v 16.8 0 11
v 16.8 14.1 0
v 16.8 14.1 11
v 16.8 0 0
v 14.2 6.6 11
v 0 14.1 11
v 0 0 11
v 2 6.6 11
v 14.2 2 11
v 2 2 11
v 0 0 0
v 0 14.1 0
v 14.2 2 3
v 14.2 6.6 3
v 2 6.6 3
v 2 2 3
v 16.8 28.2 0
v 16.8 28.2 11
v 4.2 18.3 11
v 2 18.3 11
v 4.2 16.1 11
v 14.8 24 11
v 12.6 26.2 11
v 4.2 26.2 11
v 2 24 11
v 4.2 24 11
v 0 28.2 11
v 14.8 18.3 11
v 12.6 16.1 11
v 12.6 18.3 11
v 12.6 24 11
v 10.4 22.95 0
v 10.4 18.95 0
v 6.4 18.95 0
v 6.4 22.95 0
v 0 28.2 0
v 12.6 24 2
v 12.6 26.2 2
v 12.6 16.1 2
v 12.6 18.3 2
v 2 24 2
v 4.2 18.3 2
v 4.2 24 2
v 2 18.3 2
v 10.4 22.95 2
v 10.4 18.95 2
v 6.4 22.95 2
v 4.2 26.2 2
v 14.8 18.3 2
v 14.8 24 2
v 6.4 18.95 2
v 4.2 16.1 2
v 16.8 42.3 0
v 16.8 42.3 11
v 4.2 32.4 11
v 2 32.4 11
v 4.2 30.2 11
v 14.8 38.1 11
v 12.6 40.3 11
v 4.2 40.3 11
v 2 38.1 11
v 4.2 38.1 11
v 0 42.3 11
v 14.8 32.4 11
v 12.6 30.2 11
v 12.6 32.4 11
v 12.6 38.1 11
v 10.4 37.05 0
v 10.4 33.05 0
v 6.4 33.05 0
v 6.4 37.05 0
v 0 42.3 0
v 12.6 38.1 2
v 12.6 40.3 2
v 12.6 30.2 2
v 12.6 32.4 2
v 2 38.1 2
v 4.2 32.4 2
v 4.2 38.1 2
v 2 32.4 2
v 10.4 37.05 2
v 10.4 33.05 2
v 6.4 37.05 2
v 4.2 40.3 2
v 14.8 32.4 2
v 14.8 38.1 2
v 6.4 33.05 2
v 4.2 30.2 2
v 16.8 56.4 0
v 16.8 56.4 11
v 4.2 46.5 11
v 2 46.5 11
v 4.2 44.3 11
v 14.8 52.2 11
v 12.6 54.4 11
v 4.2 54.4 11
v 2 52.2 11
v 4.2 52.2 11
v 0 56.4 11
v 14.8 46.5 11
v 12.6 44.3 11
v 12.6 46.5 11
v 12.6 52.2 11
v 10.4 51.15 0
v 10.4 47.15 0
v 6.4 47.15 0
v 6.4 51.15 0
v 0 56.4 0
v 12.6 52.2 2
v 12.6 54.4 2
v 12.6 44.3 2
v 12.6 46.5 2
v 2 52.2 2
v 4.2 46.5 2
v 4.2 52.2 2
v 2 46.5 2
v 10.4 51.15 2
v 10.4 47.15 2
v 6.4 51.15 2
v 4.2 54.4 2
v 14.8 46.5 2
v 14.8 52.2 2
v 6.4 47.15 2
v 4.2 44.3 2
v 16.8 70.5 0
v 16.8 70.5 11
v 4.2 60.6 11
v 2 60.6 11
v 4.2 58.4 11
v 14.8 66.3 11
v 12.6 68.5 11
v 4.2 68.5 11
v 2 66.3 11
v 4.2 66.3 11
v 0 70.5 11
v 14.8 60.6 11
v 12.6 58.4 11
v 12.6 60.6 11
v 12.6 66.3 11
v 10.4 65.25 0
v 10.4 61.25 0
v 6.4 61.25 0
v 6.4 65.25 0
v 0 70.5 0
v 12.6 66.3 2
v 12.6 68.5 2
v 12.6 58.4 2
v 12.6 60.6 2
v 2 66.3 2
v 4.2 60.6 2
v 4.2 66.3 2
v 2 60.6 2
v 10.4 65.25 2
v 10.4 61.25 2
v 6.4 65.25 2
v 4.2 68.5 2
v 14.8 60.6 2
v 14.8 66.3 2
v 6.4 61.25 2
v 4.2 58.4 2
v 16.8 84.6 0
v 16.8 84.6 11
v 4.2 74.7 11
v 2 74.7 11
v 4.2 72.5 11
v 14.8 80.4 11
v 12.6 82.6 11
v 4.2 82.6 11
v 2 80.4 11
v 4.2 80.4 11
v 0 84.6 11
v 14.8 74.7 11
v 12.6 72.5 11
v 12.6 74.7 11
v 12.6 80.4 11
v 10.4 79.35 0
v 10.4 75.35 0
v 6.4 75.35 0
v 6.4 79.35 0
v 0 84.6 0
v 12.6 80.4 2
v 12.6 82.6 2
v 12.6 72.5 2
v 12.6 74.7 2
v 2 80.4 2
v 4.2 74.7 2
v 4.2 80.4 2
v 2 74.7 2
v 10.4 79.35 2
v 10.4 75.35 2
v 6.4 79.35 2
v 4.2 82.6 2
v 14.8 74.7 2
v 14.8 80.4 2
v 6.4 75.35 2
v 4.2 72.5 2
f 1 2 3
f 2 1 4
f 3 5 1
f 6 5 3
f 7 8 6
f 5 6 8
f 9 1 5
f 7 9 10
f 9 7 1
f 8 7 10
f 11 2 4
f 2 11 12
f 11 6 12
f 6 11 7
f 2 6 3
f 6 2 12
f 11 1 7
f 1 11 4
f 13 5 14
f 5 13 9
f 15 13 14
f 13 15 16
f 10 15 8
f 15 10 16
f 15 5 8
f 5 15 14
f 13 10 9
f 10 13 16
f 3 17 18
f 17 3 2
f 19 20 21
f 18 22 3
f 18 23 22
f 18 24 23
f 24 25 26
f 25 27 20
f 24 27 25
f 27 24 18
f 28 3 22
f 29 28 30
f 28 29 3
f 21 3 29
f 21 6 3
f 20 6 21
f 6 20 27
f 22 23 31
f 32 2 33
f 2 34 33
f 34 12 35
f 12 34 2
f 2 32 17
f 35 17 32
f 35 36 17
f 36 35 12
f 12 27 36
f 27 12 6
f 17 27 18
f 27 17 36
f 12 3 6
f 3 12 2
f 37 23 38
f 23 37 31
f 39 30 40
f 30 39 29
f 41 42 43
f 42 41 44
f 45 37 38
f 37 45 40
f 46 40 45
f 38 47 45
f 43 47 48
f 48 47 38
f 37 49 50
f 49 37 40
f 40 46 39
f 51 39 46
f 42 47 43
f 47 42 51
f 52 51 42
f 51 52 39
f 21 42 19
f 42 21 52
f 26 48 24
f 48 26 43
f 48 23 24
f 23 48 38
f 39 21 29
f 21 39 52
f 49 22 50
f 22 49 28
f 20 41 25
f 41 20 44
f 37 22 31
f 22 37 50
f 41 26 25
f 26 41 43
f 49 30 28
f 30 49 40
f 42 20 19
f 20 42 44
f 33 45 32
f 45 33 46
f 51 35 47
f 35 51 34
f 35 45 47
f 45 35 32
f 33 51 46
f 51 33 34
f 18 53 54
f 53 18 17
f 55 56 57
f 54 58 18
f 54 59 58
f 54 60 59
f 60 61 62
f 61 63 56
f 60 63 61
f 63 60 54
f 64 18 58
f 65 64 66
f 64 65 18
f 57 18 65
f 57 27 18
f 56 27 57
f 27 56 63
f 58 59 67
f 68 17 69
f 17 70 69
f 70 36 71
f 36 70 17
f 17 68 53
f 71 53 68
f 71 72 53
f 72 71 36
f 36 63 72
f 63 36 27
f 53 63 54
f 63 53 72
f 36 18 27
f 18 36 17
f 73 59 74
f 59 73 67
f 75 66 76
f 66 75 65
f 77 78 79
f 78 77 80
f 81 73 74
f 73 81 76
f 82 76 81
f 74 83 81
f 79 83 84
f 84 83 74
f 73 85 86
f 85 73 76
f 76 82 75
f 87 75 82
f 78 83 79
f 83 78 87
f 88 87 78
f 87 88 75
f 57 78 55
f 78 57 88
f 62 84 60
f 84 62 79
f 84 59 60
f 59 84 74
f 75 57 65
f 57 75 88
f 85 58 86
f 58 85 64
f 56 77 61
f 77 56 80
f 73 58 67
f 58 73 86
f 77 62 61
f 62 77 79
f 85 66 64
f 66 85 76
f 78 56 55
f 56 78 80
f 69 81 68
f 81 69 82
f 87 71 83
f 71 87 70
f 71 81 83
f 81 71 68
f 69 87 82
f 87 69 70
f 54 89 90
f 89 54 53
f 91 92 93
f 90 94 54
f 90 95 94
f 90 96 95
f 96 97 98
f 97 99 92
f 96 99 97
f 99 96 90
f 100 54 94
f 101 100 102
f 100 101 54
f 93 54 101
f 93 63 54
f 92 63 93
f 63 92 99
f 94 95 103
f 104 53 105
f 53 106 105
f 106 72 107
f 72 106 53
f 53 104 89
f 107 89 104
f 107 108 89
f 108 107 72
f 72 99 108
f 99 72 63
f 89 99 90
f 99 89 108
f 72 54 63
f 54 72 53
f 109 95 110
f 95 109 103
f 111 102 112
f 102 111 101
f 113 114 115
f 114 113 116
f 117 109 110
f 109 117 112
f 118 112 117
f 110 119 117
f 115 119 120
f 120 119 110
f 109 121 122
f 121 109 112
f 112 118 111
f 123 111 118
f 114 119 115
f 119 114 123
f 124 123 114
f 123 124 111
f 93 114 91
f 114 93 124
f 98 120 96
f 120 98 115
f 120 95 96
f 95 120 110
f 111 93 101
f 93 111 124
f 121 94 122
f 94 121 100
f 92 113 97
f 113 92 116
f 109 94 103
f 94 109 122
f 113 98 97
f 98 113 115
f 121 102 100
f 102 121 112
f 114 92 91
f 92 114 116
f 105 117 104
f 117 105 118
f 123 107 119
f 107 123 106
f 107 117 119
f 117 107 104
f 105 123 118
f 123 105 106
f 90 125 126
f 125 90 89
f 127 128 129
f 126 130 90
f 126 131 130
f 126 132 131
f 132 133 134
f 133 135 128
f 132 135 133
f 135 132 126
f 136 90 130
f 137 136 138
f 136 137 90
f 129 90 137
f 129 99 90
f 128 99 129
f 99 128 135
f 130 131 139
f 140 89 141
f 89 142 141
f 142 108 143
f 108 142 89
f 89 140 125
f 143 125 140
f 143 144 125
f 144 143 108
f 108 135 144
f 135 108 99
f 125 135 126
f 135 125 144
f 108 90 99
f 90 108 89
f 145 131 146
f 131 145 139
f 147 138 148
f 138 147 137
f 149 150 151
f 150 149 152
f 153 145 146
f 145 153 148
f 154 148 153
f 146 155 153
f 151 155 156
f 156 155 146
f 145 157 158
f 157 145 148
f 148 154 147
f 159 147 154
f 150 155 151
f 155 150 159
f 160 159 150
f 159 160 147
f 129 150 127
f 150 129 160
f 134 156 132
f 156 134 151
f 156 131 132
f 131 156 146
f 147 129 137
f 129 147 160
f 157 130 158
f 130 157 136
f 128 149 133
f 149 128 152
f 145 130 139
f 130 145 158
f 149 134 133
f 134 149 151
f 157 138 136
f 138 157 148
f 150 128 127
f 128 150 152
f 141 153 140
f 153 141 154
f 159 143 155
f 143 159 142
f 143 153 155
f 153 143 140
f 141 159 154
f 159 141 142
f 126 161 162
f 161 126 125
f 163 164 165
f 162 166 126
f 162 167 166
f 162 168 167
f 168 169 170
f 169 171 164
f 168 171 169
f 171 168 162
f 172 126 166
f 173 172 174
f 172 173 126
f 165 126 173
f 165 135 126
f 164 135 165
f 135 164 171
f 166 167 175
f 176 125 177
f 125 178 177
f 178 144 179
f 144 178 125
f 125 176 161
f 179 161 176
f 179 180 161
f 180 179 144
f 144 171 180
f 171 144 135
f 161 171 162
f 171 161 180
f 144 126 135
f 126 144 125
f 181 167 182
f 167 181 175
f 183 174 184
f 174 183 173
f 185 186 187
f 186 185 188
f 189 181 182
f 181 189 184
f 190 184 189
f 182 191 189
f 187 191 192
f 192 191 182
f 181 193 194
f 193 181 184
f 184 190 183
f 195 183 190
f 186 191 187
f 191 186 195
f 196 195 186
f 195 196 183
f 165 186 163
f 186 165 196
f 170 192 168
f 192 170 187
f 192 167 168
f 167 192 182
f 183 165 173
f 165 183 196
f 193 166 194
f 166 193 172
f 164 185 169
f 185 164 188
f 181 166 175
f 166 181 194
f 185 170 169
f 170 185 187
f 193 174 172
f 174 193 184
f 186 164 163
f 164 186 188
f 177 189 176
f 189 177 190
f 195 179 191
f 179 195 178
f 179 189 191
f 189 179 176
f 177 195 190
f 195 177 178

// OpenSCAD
width=12.8*1;
length=5.7*1;
add=2.2*1;

depth=8*1;

hole=4*1;

t=2*1;

//CUSTOMIZER VARIABLES

// Include a USB holder?
usb="yes"; // [yes:Yes, no:No]

// How many LiPo
count=5; //[1:30]

//CUSTOMIZER VARIABLES END

usbwidth=4.6*1;
usblength=12.2*1;

if (usb == "yes") {
  difference() {
    cube([width+t*2, length+add*2+t*2, depth+t+1]);
    translate([t, t, t+1])
      cube([usblength, usbwidth, depth+2]);
  }
}

for (i=[1:count]) {
  translate([0, (length+add*2+t*2)*i, 0])
    difference() {
    cube([width+t*2, length+add*2+t*2, depth+t+1]);

    translate([t+add, t, t])
      cube([width-add*2, length+add*2, depth+2]);

    translate([t, t+add, t])
      cube([width, length, depth+2]);

    translate([width/2, length/2+hole/2,0])
      cube([hole, hole, depth+t+2]);
  }
}
